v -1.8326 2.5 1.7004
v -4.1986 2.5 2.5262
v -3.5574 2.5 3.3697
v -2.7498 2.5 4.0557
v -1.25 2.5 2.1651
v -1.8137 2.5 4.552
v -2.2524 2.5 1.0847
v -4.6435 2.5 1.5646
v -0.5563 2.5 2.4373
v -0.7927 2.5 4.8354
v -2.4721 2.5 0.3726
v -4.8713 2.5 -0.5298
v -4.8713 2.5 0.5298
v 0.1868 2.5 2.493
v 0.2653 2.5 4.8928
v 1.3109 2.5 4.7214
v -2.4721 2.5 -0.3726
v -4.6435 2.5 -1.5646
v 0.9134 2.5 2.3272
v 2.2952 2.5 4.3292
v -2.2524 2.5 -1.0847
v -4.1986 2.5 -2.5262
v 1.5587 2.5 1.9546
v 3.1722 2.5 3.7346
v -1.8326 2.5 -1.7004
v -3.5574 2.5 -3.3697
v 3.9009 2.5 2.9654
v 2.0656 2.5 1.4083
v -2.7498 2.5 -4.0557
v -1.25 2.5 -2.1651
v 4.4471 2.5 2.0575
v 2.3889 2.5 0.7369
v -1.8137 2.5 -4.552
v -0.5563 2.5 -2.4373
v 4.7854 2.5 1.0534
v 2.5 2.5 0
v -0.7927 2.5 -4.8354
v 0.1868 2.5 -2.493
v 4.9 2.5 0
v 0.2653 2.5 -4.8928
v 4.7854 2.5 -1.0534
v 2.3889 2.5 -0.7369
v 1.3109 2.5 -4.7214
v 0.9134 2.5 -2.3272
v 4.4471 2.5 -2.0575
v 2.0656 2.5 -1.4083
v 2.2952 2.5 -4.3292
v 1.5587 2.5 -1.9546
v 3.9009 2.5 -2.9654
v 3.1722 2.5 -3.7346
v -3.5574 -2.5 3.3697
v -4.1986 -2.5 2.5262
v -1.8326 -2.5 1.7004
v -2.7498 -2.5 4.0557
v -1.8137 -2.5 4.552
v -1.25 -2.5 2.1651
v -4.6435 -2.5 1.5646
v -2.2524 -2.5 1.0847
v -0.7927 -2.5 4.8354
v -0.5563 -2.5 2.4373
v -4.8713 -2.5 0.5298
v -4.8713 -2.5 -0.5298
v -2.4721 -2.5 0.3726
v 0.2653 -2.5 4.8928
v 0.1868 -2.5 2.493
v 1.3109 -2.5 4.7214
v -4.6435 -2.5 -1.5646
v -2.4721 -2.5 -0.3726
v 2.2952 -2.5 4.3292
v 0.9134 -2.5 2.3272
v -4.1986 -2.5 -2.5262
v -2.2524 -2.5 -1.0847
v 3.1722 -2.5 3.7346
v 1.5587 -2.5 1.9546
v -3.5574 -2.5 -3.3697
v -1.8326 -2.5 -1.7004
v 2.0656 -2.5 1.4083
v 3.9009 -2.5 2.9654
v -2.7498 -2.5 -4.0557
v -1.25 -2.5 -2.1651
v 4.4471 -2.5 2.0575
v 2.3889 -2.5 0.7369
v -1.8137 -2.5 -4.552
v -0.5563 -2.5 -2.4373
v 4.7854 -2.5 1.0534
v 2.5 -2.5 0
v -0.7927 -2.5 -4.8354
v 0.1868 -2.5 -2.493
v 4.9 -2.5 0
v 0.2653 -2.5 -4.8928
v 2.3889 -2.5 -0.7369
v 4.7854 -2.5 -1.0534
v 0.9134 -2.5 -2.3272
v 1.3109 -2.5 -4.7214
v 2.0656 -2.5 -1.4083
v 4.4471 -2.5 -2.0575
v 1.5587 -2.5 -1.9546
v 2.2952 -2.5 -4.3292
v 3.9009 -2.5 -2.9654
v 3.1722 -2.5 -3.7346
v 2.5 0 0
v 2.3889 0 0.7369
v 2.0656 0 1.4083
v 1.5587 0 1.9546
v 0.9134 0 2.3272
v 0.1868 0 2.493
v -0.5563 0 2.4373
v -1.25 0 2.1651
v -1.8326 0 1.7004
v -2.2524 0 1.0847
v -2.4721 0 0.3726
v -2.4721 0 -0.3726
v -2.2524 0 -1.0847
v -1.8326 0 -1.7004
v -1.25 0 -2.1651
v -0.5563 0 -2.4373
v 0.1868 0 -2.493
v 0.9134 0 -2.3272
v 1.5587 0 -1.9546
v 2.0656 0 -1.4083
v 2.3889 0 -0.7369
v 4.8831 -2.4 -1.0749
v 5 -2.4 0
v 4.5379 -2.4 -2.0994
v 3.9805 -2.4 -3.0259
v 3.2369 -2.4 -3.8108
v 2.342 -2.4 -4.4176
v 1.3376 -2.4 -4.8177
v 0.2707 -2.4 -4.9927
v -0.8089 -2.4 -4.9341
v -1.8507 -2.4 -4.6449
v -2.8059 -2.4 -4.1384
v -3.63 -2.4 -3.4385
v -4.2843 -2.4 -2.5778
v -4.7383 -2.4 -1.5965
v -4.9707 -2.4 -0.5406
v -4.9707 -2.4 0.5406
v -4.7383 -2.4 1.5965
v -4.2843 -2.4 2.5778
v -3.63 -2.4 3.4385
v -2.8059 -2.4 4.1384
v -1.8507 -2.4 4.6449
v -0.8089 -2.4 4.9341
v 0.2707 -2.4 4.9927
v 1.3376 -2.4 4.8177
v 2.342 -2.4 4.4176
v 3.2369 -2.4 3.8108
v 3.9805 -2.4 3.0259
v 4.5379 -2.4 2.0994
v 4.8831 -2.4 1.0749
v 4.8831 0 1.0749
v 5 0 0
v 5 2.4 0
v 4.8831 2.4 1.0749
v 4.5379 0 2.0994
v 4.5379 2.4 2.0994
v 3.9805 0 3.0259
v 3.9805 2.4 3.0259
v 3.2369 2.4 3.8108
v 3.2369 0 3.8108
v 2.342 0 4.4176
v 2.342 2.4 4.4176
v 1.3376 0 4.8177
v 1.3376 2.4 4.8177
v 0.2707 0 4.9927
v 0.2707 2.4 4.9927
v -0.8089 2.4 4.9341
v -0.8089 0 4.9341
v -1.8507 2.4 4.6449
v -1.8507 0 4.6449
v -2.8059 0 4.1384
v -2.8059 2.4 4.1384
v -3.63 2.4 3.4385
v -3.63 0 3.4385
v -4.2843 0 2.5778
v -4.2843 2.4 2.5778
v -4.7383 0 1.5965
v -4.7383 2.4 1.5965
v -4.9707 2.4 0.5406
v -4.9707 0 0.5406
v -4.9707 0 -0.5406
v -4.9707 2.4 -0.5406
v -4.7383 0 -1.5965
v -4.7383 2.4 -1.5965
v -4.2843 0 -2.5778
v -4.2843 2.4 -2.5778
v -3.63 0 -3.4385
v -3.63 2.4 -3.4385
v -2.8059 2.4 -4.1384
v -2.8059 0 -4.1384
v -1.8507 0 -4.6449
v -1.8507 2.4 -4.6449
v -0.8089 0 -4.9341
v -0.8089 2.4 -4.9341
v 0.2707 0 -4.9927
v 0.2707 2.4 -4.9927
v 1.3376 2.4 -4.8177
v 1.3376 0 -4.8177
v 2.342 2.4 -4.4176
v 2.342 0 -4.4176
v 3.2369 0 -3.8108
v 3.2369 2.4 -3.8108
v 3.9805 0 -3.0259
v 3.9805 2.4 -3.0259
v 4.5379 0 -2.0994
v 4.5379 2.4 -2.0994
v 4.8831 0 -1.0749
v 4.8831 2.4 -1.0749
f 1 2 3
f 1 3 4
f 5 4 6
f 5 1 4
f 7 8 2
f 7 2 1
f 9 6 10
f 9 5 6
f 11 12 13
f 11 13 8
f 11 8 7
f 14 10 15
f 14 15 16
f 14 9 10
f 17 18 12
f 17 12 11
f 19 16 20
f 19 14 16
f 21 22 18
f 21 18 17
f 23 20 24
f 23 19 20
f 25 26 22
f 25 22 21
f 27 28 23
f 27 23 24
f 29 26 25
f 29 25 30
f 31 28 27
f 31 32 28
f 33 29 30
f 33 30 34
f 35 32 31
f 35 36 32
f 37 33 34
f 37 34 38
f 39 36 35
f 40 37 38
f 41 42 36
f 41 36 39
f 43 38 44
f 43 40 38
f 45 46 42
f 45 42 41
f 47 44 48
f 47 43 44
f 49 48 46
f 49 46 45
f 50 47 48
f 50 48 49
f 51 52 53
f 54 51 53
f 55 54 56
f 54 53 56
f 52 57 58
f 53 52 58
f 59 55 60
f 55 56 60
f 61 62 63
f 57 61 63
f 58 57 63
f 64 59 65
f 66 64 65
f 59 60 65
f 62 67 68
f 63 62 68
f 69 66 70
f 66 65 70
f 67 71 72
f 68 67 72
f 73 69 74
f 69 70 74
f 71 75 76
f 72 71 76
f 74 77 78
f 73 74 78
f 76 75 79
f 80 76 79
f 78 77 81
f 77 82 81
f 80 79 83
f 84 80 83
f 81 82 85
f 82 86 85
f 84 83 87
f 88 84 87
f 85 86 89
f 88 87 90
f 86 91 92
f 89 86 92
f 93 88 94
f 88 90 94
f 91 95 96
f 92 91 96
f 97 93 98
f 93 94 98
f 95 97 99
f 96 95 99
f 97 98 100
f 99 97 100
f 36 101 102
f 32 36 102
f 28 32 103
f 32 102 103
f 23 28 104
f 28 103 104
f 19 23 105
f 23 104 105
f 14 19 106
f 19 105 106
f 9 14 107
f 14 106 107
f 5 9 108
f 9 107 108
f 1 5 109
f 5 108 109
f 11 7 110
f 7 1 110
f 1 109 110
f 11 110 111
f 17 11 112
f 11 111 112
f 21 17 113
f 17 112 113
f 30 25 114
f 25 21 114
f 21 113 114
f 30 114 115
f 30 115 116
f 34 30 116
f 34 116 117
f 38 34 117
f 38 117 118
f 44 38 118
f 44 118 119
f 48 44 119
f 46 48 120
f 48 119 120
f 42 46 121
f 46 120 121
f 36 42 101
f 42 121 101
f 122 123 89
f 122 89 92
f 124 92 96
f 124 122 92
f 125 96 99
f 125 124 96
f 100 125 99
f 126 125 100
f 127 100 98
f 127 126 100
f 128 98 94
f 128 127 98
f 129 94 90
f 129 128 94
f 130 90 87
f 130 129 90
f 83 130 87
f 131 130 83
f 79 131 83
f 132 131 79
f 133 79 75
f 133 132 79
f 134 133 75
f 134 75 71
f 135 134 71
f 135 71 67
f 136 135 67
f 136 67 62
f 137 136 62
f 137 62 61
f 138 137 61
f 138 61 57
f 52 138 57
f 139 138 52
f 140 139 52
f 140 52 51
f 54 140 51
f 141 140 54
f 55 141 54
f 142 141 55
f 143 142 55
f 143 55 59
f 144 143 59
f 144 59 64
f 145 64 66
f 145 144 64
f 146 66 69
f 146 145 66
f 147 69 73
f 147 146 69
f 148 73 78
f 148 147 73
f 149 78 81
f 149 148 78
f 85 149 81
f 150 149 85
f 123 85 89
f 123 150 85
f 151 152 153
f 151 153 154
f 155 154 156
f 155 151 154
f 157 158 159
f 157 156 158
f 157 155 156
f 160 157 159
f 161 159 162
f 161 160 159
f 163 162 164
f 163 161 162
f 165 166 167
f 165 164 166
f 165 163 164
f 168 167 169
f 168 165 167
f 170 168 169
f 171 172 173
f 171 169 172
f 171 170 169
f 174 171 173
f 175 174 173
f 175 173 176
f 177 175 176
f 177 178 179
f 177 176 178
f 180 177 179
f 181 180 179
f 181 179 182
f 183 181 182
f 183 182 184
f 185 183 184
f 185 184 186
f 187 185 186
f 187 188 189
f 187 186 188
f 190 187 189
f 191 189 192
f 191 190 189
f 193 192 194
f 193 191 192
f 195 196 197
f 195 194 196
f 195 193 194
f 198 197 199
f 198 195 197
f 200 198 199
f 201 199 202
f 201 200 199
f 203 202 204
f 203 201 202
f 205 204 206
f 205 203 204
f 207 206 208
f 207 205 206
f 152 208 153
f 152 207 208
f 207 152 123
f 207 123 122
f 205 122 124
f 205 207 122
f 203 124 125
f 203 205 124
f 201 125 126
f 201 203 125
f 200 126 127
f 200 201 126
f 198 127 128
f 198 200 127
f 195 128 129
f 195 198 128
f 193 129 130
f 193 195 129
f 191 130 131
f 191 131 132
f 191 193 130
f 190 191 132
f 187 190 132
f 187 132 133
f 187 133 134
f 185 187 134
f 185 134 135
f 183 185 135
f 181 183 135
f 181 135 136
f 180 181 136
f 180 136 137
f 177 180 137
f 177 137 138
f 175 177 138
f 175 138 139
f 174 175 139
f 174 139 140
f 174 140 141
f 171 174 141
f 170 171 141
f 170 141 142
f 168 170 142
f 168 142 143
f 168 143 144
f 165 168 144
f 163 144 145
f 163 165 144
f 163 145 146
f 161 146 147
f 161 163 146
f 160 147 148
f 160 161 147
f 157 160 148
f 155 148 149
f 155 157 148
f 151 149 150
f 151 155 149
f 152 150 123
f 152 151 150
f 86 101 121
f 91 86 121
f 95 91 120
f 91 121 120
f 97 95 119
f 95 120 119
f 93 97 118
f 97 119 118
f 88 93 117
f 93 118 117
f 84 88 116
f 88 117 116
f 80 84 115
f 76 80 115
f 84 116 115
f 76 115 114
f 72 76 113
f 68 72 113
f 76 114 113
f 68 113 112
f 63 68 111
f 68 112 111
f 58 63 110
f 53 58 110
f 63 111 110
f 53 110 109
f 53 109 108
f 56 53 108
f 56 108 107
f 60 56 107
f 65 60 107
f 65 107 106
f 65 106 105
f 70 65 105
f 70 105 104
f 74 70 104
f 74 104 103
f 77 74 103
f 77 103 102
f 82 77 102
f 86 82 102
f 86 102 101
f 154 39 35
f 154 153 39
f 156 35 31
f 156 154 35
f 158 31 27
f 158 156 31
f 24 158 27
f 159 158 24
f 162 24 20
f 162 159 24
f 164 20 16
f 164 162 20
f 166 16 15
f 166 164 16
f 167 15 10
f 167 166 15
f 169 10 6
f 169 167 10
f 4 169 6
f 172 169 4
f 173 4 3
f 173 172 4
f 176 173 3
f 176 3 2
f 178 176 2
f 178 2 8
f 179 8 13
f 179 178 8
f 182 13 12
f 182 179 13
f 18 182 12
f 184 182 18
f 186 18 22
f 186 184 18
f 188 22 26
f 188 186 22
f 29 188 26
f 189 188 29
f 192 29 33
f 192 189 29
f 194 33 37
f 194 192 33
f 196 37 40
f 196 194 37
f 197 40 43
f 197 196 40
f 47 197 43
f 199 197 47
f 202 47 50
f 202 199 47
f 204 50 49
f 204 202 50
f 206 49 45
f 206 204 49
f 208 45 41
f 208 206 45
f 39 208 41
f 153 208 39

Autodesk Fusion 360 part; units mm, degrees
sketch "Sketch1" plane through (0, 0, 0) normal (0, 1, 0) x (1, 0, 0)
  circle A0 centre (0, 0) radius 5
  circle A1 centre (0, 0) radius 2.5
  dimension "d1" = 10
  dimension "d2" = 5
extrude "Extrude1" add sketch "Sketch1" along normal mid plane 5
chamfer "Chamfer1" distance 0.1 angle 45 2 edges at (-4.6616, -2.5, -1.8081) (-4.6616, 2.5, 1.8081)
